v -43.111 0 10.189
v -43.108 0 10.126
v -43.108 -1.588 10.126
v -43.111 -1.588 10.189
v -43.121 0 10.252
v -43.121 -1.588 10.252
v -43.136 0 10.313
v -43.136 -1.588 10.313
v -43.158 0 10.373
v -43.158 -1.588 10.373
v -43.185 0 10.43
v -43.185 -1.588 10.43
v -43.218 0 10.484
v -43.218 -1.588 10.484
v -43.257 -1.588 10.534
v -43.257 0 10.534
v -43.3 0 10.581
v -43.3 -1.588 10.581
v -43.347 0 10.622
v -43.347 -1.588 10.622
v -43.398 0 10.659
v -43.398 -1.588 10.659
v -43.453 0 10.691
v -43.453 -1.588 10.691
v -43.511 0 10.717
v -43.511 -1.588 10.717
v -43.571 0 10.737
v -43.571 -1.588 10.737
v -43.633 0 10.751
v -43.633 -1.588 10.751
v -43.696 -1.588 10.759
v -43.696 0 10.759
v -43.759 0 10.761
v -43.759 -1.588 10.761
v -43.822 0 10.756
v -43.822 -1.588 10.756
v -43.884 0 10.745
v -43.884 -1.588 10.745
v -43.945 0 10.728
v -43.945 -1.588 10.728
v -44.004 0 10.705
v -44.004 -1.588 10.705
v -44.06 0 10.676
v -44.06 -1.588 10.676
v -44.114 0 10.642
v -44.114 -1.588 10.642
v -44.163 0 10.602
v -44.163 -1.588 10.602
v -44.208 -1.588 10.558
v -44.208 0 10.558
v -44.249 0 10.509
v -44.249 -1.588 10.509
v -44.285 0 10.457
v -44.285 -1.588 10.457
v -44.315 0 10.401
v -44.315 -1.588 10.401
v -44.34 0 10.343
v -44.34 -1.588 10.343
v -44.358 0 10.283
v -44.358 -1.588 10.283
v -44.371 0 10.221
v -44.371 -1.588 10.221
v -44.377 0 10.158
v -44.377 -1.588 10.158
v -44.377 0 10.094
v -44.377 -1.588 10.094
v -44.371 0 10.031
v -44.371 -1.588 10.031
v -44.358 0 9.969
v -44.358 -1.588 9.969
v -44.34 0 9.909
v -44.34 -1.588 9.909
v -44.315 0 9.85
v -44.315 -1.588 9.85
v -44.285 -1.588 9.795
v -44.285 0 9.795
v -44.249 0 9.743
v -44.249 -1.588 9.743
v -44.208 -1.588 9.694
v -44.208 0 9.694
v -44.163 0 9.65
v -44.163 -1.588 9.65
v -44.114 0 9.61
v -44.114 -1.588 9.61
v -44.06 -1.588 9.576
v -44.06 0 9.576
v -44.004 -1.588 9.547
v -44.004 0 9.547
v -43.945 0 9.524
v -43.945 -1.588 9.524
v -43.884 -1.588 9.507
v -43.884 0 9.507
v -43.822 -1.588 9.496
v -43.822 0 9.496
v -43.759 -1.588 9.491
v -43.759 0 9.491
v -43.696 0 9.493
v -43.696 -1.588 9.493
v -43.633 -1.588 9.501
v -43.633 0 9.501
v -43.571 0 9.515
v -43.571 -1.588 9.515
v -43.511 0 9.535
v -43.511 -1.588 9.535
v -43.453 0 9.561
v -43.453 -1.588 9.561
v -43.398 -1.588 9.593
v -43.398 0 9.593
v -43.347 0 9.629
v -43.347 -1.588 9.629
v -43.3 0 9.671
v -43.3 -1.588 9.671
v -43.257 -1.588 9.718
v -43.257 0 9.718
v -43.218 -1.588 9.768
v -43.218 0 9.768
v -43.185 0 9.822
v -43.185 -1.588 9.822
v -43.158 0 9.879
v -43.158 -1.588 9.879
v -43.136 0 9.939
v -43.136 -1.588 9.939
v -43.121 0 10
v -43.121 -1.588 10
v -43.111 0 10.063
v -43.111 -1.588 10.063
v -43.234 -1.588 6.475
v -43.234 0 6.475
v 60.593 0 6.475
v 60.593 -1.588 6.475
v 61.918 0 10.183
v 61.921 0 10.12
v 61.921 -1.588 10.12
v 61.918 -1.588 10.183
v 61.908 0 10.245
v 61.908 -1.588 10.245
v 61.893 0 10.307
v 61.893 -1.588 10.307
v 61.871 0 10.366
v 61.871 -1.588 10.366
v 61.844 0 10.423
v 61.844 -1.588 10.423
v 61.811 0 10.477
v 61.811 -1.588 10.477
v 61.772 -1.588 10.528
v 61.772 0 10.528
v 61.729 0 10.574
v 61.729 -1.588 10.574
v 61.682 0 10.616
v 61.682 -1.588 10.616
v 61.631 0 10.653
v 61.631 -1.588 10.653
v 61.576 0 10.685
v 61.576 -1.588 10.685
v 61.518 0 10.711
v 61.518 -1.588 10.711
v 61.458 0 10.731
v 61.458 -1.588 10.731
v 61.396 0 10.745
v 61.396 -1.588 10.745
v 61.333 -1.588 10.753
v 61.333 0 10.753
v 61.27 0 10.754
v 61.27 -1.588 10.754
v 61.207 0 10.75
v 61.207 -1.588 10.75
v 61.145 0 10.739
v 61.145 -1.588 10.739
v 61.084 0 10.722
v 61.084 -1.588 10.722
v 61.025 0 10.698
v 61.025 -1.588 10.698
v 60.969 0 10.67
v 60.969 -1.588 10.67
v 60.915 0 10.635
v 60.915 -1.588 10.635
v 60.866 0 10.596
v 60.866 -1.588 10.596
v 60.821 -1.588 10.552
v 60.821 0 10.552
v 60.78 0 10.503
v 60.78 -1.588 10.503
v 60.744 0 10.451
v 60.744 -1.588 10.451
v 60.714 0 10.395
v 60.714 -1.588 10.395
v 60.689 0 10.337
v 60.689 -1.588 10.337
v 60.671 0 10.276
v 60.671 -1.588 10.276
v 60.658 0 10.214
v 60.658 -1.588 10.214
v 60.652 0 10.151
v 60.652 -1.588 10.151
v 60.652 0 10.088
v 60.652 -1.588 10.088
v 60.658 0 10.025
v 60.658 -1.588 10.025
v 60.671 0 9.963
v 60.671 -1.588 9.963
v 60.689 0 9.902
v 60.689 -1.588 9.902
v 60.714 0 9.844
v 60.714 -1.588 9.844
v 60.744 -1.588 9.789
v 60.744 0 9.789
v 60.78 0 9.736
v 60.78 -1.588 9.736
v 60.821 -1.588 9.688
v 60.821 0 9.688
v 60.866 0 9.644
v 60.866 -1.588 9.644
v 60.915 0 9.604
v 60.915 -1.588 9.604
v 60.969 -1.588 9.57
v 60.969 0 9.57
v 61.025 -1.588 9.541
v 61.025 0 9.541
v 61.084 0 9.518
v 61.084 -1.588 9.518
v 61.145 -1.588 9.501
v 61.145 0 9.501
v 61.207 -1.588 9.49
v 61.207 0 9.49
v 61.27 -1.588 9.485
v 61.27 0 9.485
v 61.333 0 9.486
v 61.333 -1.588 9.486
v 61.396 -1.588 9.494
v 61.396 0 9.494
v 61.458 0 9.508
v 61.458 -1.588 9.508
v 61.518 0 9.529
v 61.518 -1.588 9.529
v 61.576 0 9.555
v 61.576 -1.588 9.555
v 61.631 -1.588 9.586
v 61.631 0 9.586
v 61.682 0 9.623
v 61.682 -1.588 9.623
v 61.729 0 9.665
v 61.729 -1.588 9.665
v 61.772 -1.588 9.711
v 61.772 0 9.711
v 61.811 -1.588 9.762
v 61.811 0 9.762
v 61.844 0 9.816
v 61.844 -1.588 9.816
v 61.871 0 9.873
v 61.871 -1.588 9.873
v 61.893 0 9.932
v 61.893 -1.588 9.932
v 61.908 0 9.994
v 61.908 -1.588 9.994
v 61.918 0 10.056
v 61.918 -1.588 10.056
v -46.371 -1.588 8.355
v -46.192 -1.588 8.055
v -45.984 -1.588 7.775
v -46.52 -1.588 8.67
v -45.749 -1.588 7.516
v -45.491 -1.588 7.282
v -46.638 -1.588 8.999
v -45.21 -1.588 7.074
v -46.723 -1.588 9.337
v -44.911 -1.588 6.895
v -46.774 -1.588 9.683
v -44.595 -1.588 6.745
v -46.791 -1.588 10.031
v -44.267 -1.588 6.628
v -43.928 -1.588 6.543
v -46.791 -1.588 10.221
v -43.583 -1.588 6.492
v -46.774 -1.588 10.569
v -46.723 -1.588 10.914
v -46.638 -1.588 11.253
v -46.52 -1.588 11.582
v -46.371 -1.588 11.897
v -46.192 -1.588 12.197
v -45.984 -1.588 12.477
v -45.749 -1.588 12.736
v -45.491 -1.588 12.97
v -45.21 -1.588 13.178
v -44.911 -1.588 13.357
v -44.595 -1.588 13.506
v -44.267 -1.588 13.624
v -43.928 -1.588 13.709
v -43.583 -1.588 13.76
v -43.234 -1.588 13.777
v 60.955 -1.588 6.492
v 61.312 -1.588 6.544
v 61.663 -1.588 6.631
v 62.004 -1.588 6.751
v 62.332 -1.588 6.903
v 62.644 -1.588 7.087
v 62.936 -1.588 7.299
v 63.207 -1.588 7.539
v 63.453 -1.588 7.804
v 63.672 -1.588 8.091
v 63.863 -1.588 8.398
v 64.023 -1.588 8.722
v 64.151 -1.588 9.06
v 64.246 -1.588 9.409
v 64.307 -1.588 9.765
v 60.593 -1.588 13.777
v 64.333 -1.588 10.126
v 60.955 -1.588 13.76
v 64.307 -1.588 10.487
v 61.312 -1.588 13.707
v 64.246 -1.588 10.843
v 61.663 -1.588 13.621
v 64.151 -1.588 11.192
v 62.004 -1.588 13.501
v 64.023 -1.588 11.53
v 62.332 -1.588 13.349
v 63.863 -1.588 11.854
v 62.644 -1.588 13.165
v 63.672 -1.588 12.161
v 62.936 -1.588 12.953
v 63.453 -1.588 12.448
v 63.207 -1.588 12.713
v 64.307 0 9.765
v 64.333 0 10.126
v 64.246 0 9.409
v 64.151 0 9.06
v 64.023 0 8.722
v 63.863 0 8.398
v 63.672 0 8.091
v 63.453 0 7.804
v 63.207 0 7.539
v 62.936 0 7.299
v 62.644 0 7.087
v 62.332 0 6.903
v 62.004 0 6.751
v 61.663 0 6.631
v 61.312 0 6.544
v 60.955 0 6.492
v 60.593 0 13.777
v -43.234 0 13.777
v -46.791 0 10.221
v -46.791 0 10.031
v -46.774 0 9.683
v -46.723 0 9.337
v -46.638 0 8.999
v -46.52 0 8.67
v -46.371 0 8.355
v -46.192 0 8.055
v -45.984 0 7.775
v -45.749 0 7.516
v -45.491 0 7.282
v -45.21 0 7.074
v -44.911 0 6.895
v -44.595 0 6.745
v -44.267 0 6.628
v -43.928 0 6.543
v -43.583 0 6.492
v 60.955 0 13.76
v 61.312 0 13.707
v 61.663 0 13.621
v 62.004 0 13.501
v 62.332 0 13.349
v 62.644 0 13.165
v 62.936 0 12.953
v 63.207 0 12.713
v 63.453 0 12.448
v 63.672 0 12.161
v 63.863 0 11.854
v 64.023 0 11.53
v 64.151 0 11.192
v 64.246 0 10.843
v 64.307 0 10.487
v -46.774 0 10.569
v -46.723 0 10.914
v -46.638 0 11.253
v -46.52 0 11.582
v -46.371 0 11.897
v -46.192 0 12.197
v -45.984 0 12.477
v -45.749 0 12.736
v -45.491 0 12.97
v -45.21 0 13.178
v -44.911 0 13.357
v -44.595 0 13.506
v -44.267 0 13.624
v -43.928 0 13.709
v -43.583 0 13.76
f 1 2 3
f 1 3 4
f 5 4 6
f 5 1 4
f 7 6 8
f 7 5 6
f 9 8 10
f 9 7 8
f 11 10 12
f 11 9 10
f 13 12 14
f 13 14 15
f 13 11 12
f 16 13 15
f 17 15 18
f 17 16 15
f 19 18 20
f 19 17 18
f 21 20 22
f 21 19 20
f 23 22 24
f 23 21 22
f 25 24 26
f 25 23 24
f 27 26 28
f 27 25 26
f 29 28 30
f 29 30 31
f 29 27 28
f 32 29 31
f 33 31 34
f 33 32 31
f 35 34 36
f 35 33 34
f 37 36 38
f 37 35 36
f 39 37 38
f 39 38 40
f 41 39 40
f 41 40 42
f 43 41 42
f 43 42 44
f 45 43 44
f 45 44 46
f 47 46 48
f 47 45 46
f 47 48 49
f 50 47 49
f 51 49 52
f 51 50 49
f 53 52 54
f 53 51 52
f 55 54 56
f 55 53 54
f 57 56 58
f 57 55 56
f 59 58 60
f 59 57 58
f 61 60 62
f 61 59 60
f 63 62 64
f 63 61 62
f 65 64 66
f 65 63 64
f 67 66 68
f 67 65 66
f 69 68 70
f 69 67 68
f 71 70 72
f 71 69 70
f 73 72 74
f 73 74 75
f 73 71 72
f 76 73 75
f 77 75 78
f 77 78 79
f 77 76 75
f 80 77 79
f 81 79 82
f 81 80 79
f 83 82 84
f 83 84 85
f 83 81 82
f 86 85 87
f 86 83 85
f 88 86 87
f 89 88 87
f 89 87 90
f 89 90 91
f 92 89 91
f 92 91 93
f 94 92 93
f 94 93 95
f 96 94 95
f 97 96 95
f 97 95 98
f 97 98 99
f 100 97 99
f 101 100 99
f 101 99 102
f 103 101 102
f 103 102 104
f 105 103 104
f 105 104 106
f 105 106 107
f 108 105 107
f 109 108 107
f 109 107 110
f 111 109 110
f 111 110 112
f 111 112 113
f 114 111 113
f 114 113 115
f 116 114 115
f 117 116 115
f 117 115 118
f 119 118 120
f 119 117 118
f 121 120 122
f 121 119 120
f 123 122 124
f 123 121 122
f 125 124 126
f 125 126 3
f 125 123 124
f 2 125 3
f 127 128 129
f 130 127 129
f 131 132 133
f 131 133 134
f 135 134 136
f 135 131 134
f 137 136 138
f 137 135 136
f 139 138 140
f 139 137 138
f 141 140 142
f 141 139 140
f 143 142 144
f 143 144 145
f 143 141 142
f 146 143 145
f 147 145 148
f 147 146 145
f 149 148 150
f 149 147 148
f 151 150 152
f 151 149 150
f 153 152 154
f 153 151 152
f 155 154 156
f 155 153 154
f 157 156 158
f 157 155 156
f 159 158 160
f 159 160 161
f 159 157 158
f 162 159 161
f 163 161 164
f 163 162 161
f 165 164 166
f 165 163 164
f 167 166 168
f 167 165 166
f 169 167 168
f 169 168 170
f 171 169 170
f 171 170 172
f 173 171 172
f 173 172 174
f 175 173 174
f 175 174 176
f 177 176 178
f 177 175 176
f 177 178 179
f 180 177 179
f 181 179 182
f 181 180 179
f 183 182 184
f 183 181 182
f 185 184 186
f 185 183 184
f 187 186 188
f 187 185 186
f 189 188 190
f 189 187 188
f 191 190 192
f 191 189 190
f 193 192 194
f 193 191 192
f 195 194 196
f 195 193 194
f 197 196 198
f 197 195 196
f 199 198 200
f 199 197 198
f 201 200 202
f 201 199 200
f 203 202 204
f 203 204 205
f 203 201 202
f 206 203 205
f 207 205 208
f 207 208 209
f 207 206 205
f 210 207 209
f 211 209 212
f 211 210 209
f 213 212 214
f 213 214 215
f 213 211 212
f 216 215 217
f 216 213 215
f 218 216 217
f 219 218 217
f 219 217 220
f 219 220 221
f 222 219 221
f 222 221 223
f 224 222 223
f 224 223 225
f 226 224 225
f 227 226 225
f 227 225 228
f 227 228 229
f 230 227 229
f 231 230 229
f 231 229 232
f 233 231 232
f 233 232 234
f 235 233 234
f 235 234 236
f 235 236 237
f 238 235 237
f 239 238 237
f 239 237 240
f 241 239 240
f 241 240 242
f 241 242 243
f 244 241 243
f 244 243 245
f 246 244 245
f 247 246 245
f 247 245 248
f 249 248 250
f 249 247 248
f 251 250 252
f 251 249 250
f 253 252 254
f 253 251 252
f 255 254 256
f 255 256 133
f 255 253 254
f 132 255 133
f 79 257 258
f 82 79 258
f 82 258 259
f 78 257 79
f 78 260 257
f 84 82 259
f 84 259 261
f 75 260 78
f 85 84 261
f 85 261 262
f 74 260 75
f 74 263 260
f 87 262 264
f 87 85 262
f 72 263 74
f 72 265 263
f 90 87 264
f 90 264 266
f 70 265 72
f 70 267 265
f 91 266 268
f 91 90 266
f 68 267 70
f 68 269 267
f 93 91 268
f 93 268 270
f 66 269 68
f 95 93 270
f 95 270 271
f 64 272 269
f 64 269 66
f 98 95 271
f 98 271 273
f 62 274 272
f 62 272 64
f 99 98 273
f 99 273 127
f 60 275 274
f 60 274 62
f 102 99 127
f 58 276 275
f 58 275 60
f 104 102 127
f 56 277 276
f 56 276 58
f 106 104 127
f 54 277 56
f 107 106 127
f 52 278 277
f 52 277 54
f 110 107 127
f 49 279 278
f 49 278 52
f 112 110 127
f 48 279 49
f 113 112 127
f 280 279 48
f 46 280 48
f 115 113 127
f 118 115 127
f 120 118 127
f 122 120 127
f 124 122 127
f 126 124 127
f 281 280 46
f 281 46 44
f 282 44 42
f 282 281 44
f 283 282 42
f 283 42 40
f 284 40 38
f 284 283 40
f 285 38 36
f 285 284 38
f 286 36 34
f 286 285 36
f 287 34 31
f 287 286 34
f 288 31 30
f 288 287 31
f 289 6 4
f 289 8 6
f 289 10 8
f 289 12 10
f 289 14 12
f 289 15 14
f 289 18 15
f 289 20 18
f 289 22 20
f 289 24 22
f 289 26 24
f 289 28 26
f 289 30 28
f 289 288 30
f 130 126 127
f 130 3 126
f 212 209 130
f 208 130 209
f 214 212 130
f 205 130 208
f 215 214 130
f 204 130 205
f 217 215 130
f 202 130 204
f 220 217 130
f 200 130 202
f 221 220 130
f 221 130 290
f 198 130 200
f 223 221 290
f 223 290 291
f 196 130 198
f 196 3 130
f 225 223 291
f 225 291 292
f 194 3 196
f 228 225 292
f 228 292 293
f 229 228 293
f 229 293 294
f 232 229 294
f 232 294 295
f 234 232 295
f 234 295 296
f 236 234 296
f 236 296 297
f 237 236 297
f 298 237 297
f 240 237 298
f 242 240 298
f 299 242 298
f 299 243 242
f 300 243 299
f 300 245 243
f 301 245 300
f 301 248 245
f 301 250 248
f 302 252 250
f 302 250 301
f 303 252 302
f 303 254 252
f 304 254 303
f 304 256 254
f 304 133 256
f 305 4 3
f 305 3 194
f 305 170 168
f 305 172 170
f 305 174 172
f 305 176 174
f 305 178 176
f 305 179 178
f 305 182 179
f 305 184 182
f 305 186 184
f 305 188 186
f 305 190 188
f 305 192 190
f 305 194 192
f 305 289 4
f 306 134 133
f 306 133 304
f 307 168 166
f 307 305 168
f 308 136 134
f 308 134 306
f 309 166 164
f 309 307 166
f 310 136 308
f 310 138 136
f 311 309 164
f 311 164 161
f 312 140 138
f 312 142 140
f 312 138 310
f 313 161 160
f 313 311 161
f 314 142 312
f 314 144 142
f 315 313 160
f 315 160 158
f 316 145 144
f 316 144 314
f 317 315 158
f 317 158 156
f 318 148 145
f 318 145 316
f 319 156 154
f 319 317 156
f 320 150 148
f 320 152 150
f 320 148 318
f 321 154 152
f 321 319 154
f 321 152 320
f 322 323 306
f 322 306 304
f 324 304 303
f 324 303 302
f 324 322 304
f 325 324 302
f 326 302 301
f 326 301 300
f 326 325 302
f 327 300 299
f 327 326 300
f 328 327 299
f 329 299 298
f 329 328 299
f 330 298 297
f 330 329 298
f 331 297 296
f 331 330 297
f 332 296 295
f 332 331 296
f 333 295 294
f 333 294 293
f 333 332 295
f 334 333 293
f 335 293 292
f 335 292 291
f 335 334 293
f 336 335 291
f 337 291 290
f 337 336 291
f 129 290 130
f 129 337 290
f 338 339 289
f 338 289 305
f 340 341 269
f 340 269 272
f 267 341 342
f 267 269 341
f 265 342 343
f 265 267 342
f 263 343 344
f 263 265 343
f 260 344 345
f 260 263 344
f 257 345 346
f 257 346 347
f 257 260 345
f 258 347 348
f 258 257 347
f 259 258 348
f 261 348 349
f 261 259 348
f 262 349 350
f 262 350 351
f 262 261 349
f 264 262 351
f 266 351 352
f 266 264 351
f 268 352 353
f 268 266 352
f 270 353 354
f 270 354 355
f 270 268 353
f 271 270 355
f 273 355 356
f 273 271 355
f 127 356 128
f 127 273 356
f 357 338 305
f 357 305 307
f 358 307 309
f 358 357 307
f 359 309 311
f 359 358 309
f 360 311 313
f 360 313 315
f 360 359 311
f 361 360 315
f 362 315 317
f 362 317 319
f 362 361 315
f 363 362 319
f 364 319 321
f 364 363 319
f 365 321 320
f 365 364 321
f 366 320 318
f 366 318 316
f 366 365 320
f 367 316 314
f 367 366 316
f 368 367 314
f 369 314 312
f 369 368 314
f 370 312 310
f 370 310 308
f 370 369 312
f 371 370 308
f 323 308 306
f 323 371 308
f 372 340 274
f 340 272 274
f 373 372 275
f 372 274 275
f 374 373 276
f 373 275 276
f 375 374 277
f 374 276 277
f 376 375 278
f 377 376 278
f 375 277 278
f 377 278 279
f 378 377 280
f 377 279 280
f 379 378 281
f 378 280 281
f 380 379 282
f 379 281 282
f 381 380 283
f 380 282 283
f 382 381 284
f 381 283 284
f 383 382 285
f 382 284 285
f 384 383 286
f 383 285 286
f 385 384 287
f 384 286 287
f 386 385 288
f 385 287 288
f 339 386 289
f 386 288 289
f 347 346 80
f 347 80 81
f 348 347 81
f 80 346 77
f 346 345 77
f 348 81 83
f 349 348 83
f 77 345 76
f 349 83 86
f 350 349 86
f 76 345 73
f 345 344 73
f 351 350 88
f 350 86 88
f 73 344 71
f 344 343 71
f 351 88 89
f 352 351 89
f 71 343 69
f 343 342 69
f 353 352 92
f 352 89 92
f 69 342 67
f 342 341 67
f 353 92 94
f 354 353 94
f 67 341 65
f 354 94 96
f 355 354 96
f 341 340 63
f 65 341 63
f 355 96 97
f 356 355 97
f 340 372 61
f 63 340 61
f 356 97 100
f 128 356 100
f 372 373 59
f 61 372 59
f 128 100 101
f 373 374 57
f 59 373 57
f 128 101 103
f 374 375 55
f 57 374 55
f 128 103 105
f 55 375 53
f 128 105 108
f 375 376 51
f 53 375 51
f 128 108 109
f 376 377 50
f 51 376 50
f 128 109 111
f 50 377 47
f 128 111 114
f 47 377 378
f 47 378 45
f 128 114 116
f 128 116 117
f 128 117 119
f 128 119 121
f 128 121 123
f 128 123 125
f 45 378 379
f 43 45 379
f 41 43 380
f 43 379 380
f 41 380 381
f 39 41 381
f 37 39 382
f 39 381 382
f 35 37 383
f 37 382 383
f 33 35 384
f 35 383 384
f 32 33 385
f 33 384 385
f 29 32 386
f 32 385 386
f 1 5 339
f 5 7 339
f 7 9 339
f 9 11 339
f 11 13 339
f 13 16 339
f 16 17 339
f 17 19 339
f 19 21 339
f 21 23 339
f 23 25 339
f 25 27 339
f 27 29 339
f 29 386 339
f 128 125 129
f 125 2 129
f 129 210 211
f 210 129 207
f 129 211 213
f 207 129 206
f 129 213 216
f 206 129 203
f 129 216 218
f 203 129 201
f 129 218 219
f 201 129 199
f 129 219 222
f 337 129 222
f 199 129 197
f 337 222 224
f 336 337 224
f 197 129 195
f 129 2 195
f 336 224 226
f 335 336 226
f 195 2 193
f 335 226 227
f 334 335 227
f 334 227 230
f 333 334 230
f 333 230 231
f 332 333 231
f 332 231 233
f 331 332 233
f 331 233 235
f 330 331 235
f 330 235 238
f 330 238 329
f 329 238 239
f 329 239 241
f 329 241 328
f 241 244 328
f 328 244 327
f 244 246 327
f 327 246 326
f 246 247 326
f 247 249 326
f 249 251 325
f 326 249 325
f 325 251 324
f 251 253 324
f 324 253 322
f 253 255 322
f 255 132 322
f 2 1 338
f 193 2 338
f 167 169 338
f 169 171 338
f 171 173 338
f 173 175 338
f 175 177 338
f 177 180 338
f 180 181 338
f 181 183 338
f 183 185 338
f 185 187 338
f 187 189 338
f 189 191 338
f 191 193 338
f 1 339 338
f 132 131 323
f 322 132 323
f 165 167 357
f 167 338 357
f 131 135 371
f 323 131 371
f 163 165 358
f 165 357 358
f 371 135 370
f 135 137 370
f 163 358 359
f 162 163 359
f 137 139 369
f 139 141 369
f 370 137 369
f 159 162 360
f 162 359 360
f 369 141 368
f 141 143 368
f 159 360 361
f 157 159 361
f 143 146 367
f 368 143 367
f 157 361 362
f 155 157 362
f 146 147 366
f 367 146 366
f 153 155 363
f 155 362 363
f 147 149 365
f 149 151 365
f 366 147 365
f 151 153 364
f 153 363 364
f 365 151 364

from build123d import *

# Parameters (mm, degrees)
F0_W        = 111.125
F0_H        = 7.3025
F0_R        = 0.635
F1_DEPTH    = 1.5875
F2_R        = 3.5566194201
F3_T1_DEPTH = 20.2904124677


# Not quite as in the source:
# - a fillet or chamfer that OpenCascade refuses, or shapes differently, is made with other operations: its cross-section is extruded or revolved along the edge and cut away or added


with BuildPart() as f1:
    # F0 (on Front) → F1 (new body)
    with BuildSketch(Plane.XZ):
        with Locations((8.7715025485, 10.1259618964)):
            Rectangle(F0_W, F0_H)
        with Locations((-43.7429974515, 10.1259618964)):
            Circle(F0_R, mode=Mode.SUBTRACT)
        with Locations((61.2860025485, 10.1196118964)):
            Circle(F0_R, mode=Mode.SUBTRACT)
    extrude(amount=F1_DEPTH)

    # F2
    f2_edges = [f1.edges().sort_by_distance(p)[0] for p in [
        (-46.790997, -0.79375, 13.777212),
        (-46.790997, -0.79375, 6.474712),
    ]]
    fillet(f2_edges, radius=F2_R)

    # F3: fillet of radius 3.7405824935 on 2 edges, made by hand

    # F3_s2 → F3_t1 (cut)
    with BuildSketch(Plane.XZ.offset(-9.3514562339)):
        with BuildLine():
            ThreePointArc((60.5934200549, 13.7772118964), (63.2384113017, 12.6816206496), (64.3340025485, 10.0366294028))
            Line((64.3340025485, 10.0366294028), (64.3340025485, 13.7772118964))
            Line((64.3340025485, 13.7772118964), (60.5934200549, 13.7772118964))
        make_face()
        with BuildLine():
            ThreePointArc((64.3340025485, 10.2152943899), (63.2384113017, 7.5703031432), (60.5934200549, 6.4747118964))
            Line((60.5934200549, 6.4747118964), (64.3340025485, 6.4747118964))
            Line((64.3340025485, 6.4747118964), (64.3340025485, 10.2152943899))
        make_face()
    extrude(amount=F3_T1_DEPTH, mode=Mode.SUBTRACT)


solid = f1.part
